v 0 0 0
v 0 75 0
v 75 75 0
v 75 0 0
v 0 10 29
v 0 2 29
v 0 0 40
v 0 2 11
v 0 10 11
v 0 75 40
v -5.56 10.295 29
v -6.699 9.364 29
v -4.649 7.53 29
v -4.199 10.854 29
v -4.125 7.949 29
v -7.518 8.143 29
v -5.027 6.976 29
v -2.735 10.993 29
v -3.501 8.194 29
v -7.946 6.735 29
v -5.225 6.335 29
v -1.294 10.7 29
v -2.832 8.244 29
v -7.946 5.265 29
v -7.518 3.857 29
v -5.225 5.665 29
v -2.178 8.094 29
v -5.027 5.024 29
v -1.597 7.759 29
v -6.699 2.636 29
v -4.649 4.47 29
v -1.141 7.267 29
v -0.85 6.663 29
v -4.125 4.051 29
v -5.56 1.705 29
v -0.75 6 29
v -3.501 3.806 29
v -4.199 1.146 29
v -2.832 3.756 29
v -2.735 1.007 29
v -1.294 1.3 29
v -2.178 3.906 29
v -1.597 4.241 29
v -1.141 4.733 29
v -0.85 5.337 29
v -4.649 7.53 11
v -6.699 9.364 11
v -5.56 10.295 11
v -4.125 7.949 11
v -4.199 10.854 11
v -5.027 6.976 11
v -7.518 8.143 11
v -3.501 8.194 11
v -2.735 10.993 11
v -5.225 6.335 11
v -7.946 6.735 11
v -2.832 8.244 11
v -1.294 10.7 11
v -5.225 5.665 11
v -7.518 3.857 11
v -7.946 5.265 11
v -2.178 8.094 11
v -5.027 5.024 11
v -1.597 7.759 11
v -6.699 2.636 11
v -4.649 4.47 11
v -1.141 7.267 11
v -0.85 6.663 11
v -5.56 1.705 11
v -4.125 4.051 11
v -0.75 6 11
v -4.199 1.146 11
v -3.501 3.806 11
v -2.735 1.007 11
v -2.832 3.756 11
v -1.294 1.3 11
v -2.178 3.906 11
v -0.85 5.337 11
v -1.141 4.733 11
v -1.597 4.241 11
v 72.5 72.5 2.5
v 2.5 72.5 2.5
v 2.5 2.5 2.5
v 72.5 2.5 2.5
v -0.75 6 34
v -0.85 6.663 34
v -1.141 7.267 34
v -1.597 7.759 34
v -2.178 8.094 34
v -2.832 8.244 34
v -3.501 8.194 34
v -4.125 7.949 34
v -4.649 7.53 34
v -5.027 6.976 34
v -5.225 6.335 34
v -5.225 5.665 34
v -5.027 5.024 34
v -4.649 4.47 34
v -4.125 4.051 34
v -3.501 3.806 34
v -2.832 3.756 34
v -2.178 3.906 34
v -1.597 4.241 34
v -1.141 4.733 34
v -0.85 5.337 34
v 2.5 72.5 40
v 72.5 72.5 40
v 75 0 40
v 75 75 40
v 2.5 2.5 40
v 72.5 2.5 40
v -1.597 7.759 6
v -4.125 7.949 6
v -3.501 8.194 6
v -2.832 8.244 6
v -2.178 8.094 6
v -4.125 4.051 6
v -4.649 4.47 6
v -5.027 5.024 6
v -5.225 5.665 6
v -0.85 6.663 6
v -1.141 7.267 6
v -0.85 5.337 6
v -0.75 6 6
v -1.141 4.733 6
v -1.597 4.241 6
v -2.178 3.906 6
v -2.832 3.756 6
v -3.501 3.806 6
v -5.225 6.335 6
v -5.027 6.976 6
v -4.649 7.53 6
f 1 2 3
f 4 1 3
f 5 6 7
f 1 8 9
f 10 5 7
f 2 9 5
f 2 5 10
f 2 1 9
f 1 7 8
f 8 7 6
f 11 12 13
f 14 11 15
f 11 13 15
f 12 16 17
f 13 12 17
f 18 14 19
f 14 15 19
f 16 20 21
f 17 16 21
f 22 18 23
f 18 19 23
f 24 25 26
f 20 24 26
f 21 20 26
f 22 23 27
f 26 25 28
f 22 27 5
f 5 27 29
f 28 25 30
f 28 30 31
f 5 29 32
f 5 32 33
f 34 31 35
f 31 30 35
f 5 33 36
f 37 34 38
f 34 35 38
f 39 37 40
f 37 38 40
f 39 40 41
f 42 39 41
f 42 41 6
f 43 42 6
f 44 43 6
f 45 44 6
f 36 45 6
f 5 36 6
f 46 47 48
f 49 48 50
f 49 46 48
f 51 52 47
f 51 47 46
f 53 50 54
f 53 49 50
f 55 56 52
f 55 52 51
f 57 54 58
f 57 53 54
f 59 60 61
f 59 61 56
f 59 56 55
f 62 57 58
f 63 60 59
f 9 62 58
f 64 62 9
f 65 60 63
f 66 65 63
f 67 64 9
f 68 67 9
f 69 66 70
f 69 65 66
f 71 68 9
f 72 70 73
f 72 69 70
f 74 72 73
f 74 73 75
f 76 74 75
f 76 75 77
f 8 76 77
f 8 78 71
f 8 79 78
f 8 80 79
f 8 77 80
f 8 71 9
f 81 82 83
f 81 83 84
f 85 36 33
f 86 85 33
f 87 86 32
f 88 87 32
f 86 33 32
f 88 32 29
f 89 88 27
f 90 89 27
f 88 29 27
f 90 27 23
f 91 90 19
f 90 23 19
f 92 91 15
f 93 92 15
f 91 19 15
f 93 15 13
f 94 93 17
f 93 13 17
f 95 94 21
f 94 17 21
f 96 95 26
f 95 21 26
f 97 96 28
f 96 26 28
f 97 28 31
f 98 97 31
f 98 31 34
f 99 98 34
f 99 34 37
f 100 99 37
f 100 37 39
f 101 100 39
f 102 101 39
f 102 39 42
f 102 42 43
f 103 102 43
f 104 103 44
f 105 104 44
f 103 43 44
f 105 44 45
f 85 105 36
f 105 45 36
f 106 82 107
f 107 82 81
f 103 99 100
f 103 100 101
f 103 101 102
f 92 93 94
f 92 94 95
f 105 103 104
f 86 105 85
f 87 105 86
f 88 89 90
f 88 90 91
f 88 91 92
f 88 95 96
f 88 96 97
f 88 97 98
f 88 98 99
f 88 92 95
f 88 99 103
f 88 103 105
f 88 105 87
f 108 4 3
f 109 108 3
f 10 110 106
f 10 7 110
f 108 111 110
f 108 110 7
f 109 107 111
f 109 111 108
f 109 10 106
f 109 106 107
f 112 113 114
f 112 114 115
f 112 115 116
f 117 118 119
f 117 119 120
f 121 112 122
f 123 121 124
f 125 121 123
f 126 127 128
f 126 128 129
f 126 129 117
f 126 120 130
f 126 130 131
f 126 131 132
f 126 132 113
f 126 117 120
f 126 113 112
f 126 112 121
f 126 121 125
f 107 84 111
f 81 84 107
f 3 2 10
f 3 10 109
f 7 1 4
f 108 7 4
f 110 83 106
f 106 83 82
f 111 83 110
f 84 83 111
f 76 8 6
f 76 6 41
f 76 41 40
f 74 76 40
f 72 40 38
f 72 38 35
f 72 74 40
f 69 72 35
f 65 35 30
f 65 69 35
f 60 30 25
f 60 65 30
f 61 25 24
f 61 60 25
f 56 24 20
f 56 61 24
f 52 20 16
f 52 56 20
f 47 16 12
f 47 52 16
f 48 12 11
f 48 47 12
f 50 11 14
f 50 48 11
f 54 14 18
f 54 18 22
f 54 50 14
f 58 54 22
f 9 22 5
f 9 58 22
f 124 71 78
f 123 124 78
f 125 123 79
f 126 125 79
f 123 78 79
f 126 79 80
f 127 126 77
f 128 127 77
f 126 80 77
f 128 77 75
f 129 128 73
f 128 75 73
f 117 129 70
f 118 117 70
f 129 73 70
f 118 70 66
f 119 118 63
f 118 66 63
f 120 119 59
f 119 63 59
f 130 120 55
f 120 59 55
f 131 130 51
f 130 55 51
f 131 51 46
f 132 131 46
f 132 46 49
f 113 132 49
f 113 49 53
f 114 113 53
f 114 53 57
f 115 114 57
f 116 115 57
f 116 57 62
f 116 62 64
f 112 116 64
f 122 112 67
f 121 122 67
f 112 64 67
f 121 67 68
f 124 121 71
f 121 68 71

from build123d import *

# Parameters (mm, degrees)
F0_W     = 75
F0_H     = 75
F1_DEPTH = 40
F2_T     = -2.5
F5_DEPTH = 9
F7_R     = 2.25
F8_DEPTH = 5
F6_R     = 2.25
F9_DEPTH = 5


with BuildPart() as f1:
    # F0 (on Top) → F1 (new body)
    with BuildSketch(Plane.XY):
        with Locations((37.5, 37.5)):
            Rectangle(F0_W, F0_H)
    extrude(amount=F1_DEPTH)

    # F2
    f2_openings = [f1.faces().sort_by_distance(p)[0] for p in [
        (37.5, 37.5, 40),
    ]]
    offset(amount=F2_T, openings=f2_openings)

    # F4 (on offset) → F5 (join, symmetric)
    with BuildSketch(Plane(origin=(0, 0, 20), x_dir=(1, 0, 0), z_dir=(0, 0, -1))):
        with BuildLine():
            Line((0, -10), (0, -2))
            ThreePointArc((0, -2), (-8, -6), (0, -10))
        make_face()
    extrude(amount=F5_DEPTH, both=True)

    # F7 (on face) → F8 (join)
    with BuildSketch(Plane(origin=(0, 0, 11), x_dir=(1, 0, 0), z_dir=(0, 0, -1))):
        with Locations((-3, -6)):
            Circle(F7_R)
    extrude(amount=F8_DEPTH)

    # F6 (on face) → F9 (join)
    with BuildSketch(Plane.XY.offset(29)):
        with Locations((-3, 6)):
            Circle(F6_R)
    extrude(amount=F9_DEPTH)


solid = f1.part
